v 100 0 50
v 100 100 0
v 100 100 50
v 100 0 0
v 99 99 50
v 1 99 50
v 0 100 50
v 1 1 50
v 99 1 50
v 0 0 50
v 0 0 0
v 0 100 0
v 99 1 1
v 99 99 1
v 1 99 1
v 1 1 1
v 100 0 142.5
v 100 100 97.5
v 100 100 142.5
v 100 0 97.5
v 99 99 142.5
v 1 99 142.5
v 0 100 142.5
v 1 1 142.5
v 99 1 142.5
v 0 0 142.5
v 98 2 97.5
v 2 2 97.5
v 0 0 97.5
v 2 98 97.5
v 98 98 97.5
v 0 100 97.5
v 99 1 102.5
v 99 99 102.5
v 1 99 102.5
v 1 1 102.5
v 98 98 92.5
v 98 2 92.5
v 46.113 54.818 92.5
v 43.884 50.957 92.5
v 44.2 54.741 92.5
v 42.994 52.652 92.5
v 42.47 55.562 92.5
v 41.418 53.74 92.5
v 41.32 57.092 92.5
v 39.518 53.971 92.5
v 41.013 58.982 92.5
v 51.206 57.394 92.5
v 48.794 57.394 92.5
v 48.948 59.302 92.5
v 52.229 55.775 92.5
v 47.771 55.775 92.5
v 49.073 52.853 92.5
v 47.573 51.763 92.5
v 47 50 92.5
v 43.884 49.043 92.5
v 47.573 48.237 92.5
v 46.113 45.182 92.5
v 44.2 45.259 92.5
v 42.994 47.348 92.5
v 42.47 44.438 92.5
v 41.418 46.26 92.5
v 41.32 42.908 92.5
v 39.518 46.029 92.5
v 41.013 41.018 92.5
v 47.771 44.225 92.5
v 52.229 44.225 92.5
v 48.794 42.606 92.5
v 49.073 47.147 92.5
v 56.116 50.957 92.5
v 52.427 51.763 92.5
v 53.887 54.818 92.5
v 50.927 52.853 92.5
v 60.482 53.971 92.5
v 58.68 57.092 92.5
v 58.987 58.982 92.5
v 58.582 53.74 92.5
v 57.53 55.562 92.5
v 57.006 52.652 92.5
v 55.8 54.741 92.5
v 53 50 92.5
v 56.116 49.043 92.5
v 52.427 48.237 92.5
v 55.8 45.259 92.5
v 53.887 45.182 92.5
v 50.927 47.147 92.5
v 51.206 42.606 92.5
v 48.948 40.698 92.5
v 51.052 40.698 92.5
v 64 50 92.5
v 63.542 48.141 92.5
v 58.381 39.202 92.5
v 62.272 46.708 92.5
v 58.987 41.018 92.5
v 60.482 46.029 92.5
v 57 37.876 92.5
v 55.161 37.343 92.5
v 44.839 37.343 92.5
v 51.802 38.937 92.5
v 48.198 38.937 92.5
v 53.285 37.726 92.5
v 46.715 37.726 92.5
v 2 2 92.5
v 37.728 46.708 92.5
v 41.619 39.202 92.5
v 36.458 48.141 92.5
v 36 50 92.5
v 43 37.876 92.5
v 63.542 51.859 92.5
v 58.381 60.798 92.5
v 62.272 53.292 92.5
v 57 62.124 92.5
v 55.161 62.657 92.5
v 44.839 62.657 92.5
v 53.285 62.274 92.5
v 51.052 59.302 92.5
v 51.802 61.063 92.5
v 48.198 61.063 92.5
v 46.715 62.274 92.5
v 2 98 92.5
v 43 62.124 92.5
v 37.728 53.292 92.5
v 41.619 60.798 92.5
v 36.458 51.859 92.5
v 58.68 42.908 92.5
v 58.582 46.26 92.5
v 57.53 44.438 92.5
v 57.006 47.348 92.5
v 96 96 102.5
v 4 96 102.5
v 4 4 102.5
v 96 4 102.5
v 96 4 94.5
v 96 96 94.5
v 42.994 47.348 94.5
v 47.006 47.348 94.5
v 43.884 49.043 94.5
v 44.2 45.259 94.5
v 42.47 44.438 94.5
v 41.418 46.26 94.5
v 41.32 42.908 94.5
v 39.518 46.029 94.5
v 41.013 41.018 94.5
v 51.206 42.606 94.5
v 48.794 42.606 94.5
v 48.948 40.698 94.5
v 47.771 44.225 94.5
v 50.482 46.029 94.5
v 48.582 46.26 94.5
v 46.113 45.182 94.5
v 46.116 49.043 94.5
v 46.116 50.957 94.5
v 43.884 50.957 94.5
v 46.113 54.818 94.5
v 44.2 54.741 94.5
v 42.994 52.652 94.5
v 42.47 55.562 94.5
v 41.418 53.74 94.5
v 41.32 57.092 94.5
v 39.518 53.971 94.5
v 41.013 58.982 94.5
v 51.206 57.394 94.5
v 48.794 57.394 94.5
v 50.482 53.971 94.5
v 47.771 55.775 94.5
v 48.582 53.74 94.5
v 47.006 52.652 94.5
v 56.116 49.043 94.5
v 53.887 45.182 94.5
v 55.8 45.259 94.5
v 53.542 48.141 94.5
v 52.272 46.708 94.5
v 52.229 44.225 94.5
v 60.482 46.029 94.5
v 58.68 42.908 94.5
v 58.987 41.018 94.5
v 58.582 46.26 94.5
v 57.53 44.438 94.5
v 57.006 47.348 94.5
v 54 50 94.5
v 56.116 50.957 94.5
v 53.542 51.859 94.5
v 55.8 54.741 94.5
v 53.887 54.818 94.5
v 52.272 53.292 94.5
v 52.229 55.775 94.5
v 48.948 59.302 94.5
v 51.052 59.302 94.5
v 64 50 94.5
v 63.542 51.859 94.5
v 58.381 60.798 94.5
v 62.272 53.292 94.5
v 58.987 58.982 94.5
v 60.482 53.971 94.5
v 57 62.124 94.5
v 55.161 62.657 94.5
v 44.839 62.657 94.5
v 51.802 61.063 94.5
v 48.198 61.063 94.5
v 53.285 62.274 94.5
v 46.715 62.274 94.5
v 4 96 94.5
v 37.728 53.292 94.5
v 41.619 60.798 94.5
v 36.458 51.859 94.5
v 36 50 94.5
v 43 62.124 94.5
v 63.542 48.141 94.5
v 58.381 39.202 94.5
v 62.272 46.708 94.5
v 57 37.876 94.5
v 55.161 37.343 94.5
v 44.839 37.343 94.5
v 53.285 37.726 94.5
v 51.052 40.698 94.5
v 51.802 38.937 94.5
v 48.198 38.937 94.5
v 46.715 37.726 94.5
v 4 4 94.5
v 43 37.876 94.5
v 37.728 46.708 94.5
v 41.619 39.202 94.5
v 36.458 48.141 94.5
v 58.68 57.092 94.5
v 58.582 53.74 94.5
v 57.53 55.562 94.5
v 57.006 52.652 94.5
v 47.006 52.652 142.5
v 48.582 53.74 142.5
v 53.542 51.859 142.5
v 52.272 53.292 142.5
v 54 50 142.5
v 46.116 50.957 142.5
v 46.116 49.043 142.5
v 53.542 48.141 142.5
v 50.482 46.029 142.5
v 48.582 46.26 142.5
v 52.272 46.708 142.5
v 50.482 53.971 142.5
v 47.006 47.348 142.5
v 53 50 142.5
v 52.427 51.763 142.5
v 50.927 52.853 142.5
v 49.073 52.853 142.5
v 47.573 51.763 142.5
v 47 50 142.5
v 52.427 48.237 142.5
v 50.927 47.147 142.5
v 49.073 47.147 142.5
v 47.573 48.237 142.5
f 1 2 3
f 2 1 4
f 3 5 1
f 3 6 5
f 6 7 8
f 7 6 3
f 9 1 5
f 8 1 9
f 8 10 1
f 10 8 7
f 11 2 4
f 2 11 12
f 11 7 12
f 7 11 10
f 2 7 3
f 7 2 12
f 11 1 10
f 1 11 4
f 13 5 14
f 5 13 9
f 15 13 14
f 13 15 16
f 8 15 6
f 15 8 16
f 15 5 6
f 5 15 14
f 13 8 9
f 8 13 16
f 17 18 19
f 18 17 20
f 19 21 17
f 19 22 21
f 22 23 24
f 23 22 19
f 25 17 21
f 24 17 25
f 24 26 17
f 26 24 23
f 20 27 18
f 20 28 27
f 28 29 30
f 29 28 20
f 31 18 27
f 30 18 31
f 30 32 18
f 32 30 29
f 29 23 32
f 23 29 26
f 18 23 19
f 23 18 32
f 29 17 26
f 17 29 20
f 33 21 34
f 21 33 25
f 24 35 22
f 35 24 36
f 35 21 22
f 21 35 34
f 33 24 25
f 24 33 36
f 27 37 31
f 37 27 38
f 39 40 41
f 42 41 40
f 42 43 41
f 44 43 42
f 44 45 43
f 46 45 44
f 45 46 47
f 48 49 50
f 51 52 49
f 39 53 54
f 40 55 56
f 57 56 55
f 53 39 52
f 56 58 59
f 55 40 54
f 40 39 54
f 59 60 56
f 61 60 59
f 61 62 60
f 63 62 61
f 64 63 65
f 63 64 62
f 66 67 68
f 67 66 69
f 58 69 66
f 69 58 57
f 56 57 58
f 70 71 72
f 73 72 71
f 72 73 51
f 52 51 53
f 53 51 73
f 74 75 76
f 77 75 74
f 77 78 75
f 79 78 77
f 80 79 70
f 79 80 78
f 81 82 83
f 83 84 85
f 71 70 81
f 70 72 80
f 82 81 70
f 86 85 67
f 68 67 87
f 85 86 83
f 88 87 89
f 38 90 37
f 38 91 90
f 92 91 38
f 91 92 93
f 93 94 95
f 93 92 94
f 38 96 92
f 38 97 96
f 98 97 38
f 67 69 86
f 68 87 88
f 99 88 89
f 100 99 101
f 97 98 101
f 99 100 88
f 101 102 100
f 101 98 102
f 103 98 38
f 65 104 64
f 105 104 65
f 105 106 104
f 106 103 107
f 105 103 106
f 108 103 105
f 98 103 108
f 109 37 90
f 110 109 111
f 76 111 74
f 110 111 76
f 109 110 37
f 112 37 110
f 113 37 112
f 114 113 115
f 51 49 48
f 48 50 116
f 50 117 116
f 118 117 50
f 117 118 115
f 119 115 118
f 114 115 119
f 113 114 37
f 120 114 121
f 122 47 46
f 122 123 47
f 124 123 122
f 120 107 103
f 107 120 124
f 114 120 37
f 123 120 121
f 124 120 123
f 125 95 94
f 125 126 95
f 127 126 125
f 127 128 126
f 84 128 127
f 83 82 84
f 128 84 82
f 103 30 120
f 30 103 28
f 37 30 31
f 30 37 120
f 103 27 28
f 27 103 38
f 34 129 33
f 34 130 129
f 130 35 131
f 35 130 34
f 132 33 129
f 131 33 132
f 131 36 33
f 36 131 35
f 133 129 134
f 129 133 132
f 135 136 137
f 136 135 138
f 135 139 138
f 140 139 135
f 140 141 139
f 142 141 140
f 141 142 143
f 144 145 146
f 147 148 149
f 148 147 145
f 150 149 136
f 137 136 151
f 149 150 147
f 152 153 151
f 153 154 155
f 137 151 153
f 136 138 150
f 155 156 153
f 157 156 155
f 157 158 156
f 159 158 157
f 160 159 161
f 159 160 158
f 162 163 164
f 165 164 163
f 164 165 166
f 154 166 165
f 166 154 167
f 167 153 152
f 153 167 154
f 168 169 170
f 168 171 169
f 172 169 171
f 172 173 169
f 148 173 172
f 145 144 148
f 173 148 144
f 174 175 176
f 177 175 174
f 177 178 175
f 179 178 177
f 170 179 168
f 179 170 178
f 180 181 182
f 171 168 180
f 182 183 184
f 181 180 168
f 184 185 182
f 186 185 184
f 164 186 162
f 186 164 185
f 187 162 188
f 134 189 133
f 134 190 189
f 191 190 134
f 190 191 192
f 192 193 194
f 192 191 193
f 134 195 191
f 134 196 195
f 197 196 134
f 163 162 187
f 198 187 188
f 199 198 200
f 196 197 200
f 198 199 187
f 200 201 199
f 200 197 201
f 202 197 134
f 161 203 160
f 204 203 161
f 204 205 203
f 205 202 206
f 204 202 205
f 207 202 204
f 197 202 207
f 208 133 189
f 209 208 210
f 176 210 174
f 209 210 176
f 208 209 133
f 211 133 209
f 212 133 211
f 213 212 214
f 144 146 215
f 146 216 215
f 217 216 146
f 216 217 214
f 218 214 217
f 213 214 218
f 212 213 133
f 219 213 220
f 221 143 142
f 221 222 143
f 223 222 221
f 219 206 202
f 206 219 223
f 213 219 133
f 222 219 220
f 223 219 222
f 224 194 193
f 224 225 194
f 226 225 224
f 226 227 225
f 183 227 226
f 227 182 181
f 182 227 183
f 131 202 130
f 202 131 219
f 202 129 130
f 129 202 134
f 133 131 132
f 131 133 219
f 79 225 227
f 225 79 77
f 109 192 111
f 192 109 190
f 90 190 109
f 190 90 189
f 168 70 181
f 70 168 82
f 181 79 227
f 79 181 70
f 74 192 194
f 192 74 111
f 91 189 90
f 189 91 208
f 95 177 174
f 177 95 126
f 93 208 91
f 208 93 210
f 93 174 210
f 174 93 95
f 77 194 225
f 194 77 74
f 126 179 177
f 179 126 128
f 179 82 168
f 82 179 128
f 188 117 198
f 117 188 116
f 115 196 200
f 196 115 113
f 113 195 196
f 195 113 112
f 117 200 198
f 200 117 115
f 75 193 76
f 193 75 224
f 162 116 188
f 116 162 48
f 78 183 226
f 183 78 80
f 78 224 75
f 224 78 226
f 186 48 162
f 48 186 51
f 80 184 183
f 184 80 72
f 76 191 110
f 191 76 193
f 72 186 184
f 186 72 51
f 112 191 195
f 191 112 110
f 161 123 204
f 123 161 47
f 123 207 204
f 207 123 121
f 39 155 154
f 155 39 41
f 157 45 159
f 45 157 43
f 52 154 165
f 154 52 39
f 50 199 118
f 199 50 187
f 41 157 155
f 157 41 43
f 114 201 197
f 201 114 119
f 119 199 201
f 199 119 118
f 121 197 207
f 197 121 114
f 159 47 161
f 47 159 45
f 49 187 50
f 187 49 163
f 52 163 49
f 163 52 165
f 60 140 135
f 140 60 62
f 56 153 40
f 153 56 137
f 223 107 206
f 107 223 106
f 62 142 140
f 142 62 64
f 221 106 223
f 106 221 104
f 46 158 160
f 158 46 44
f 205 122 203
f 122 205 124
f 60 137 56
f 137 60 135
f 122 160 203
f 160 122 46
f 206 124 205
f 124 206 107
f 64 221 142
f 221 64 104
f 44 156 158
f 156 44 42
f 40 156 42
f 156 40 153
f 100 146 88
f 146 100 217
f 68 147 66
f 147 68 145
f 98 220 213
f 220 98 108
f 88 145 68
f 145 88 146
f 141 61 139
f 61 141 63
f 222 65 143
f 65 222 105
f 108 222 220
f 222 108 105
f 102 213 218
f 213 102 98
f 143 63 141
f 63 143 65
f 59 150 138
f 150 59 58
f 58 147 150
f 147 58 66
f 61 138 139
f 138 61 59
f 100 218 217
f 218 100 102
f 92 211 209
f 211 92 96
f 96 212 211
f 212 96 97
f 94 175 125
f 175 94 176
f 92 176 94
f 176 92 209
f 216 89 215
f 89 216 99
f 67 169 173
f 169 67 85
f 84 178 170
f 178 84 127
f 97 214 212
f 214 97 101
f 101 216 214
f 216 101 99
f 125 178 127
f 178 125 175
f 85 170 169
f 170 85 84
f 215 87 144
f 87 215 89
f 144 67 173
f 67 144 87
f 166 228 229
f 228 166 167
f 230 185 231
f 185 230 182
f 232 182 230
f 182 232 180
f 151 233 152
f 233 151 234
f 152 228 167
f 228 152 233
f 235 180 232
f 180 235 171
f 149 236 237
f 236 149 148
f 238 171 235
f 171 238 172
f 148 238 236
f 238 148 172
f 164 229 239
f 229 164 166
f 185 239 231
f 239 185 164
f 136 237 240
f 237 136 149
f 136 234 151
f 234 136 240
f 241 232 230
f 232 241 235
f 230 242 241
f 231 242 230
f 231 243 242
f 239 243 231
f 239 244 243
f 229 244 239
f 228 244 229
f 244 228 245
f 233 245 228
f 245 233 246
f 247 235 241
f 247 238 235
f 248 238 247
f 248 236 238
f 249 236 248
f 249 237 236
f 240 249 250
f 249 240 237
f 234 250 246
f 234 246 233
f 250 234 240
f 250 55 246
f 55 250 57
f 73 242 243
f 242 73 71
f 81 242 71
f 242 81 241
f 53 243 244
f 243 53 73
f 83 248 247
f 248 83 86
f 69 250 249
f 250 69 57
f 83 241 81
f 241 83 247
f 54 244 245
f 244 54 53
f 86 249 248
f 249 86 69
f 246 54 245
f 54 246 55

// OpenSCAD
// file: planter.scad
include <parameters.scad>

module planter() {
  union() {
    difference() {
      difference() {
        union() {
          // Top part of planter
          color("lime") difference() {
            cube(size = [ $width, $depth, $height - $connection ],
                 center = true);

            // DIFF
            translate([ 0, 0, $margin ]) cube(
                size =
                    [ $width - $margin, $depth - $margin, $height + $margin ],
                center = true);
          }

          // Bottom connector
          color("tomato") translate([ 0, 0, -($height / 2) ]) {
            union() {
              // Connector part
              cube(size =
                       [
                         $width - $margin * 2, $depth - $margin * 2,
                         $connection
                       ],
                   center = true);

              // Connecting bit to outer shell
              translate([ 0, 0, $connection ])
                  cube(size = [ $width, $depth, $connection ], center = true);
            }
          }
        }
        // DIFF
        translate([ 0, 0, -$height / 2 + $margin * 2 ])
            cube(size =
                     [
                       $width - $margin * 4, $depth - $margin * 4,
                       $connection + $margin * 2
                     ],
                 center = true);
      }

      // Drainage holes
      translate([ 0, 0, -$height ]) cylinder($height, $hole_dia, $hole_dia);
      for (i = [0:5]) {
        rotate([ 0, 0, 360 / 6 * i ])
            translate([ $hole_dia * 2 + $margin, 0, -$height ])
                cylinder($height, $hole_dia, $hole_dia);
      }
    }

    color("violet") translate([ 0, 0, -$height / 2 - $margin * 1.25 ]) {
      difference() {
        cylinder($height, $hole_dia, $hole_dia);
        translate([ 0, 0, -$margin ])
            cylinder($height + $margin * 2, $hole_dia - $margin * 0.5,
                     $hole_dia - $margin * 0.5);
      }
    }
  }
}
planter();
// file: basin.scad
include <parameters.scad>

module basin() {
  color("cyan") difference() {
    cube(size = [ $width, $depth, $height ], center = true);

    // DIFF
    translate([ 0, 0, $margin ])
        cube(size = [ $width - $margin, $depth - $margin, $height + $margin ],
             center = true);
  }
}
basin();
// file: parameters.scad
$width = 100;
$depth = 100;
$height = 50;

$margin = 2;

$connection = 5;

$hole_dia = 4;
// main file
include <parameters.scad>
use <basin.scad>
use <planter.scad>

translate([ $width / 2, $depth / 2, $height / 2 ]) basin();
translate([
  $width / 2, $depth / 2,
  $height / 2 + $height - $connection + $height - $height *$t
]) planter();
